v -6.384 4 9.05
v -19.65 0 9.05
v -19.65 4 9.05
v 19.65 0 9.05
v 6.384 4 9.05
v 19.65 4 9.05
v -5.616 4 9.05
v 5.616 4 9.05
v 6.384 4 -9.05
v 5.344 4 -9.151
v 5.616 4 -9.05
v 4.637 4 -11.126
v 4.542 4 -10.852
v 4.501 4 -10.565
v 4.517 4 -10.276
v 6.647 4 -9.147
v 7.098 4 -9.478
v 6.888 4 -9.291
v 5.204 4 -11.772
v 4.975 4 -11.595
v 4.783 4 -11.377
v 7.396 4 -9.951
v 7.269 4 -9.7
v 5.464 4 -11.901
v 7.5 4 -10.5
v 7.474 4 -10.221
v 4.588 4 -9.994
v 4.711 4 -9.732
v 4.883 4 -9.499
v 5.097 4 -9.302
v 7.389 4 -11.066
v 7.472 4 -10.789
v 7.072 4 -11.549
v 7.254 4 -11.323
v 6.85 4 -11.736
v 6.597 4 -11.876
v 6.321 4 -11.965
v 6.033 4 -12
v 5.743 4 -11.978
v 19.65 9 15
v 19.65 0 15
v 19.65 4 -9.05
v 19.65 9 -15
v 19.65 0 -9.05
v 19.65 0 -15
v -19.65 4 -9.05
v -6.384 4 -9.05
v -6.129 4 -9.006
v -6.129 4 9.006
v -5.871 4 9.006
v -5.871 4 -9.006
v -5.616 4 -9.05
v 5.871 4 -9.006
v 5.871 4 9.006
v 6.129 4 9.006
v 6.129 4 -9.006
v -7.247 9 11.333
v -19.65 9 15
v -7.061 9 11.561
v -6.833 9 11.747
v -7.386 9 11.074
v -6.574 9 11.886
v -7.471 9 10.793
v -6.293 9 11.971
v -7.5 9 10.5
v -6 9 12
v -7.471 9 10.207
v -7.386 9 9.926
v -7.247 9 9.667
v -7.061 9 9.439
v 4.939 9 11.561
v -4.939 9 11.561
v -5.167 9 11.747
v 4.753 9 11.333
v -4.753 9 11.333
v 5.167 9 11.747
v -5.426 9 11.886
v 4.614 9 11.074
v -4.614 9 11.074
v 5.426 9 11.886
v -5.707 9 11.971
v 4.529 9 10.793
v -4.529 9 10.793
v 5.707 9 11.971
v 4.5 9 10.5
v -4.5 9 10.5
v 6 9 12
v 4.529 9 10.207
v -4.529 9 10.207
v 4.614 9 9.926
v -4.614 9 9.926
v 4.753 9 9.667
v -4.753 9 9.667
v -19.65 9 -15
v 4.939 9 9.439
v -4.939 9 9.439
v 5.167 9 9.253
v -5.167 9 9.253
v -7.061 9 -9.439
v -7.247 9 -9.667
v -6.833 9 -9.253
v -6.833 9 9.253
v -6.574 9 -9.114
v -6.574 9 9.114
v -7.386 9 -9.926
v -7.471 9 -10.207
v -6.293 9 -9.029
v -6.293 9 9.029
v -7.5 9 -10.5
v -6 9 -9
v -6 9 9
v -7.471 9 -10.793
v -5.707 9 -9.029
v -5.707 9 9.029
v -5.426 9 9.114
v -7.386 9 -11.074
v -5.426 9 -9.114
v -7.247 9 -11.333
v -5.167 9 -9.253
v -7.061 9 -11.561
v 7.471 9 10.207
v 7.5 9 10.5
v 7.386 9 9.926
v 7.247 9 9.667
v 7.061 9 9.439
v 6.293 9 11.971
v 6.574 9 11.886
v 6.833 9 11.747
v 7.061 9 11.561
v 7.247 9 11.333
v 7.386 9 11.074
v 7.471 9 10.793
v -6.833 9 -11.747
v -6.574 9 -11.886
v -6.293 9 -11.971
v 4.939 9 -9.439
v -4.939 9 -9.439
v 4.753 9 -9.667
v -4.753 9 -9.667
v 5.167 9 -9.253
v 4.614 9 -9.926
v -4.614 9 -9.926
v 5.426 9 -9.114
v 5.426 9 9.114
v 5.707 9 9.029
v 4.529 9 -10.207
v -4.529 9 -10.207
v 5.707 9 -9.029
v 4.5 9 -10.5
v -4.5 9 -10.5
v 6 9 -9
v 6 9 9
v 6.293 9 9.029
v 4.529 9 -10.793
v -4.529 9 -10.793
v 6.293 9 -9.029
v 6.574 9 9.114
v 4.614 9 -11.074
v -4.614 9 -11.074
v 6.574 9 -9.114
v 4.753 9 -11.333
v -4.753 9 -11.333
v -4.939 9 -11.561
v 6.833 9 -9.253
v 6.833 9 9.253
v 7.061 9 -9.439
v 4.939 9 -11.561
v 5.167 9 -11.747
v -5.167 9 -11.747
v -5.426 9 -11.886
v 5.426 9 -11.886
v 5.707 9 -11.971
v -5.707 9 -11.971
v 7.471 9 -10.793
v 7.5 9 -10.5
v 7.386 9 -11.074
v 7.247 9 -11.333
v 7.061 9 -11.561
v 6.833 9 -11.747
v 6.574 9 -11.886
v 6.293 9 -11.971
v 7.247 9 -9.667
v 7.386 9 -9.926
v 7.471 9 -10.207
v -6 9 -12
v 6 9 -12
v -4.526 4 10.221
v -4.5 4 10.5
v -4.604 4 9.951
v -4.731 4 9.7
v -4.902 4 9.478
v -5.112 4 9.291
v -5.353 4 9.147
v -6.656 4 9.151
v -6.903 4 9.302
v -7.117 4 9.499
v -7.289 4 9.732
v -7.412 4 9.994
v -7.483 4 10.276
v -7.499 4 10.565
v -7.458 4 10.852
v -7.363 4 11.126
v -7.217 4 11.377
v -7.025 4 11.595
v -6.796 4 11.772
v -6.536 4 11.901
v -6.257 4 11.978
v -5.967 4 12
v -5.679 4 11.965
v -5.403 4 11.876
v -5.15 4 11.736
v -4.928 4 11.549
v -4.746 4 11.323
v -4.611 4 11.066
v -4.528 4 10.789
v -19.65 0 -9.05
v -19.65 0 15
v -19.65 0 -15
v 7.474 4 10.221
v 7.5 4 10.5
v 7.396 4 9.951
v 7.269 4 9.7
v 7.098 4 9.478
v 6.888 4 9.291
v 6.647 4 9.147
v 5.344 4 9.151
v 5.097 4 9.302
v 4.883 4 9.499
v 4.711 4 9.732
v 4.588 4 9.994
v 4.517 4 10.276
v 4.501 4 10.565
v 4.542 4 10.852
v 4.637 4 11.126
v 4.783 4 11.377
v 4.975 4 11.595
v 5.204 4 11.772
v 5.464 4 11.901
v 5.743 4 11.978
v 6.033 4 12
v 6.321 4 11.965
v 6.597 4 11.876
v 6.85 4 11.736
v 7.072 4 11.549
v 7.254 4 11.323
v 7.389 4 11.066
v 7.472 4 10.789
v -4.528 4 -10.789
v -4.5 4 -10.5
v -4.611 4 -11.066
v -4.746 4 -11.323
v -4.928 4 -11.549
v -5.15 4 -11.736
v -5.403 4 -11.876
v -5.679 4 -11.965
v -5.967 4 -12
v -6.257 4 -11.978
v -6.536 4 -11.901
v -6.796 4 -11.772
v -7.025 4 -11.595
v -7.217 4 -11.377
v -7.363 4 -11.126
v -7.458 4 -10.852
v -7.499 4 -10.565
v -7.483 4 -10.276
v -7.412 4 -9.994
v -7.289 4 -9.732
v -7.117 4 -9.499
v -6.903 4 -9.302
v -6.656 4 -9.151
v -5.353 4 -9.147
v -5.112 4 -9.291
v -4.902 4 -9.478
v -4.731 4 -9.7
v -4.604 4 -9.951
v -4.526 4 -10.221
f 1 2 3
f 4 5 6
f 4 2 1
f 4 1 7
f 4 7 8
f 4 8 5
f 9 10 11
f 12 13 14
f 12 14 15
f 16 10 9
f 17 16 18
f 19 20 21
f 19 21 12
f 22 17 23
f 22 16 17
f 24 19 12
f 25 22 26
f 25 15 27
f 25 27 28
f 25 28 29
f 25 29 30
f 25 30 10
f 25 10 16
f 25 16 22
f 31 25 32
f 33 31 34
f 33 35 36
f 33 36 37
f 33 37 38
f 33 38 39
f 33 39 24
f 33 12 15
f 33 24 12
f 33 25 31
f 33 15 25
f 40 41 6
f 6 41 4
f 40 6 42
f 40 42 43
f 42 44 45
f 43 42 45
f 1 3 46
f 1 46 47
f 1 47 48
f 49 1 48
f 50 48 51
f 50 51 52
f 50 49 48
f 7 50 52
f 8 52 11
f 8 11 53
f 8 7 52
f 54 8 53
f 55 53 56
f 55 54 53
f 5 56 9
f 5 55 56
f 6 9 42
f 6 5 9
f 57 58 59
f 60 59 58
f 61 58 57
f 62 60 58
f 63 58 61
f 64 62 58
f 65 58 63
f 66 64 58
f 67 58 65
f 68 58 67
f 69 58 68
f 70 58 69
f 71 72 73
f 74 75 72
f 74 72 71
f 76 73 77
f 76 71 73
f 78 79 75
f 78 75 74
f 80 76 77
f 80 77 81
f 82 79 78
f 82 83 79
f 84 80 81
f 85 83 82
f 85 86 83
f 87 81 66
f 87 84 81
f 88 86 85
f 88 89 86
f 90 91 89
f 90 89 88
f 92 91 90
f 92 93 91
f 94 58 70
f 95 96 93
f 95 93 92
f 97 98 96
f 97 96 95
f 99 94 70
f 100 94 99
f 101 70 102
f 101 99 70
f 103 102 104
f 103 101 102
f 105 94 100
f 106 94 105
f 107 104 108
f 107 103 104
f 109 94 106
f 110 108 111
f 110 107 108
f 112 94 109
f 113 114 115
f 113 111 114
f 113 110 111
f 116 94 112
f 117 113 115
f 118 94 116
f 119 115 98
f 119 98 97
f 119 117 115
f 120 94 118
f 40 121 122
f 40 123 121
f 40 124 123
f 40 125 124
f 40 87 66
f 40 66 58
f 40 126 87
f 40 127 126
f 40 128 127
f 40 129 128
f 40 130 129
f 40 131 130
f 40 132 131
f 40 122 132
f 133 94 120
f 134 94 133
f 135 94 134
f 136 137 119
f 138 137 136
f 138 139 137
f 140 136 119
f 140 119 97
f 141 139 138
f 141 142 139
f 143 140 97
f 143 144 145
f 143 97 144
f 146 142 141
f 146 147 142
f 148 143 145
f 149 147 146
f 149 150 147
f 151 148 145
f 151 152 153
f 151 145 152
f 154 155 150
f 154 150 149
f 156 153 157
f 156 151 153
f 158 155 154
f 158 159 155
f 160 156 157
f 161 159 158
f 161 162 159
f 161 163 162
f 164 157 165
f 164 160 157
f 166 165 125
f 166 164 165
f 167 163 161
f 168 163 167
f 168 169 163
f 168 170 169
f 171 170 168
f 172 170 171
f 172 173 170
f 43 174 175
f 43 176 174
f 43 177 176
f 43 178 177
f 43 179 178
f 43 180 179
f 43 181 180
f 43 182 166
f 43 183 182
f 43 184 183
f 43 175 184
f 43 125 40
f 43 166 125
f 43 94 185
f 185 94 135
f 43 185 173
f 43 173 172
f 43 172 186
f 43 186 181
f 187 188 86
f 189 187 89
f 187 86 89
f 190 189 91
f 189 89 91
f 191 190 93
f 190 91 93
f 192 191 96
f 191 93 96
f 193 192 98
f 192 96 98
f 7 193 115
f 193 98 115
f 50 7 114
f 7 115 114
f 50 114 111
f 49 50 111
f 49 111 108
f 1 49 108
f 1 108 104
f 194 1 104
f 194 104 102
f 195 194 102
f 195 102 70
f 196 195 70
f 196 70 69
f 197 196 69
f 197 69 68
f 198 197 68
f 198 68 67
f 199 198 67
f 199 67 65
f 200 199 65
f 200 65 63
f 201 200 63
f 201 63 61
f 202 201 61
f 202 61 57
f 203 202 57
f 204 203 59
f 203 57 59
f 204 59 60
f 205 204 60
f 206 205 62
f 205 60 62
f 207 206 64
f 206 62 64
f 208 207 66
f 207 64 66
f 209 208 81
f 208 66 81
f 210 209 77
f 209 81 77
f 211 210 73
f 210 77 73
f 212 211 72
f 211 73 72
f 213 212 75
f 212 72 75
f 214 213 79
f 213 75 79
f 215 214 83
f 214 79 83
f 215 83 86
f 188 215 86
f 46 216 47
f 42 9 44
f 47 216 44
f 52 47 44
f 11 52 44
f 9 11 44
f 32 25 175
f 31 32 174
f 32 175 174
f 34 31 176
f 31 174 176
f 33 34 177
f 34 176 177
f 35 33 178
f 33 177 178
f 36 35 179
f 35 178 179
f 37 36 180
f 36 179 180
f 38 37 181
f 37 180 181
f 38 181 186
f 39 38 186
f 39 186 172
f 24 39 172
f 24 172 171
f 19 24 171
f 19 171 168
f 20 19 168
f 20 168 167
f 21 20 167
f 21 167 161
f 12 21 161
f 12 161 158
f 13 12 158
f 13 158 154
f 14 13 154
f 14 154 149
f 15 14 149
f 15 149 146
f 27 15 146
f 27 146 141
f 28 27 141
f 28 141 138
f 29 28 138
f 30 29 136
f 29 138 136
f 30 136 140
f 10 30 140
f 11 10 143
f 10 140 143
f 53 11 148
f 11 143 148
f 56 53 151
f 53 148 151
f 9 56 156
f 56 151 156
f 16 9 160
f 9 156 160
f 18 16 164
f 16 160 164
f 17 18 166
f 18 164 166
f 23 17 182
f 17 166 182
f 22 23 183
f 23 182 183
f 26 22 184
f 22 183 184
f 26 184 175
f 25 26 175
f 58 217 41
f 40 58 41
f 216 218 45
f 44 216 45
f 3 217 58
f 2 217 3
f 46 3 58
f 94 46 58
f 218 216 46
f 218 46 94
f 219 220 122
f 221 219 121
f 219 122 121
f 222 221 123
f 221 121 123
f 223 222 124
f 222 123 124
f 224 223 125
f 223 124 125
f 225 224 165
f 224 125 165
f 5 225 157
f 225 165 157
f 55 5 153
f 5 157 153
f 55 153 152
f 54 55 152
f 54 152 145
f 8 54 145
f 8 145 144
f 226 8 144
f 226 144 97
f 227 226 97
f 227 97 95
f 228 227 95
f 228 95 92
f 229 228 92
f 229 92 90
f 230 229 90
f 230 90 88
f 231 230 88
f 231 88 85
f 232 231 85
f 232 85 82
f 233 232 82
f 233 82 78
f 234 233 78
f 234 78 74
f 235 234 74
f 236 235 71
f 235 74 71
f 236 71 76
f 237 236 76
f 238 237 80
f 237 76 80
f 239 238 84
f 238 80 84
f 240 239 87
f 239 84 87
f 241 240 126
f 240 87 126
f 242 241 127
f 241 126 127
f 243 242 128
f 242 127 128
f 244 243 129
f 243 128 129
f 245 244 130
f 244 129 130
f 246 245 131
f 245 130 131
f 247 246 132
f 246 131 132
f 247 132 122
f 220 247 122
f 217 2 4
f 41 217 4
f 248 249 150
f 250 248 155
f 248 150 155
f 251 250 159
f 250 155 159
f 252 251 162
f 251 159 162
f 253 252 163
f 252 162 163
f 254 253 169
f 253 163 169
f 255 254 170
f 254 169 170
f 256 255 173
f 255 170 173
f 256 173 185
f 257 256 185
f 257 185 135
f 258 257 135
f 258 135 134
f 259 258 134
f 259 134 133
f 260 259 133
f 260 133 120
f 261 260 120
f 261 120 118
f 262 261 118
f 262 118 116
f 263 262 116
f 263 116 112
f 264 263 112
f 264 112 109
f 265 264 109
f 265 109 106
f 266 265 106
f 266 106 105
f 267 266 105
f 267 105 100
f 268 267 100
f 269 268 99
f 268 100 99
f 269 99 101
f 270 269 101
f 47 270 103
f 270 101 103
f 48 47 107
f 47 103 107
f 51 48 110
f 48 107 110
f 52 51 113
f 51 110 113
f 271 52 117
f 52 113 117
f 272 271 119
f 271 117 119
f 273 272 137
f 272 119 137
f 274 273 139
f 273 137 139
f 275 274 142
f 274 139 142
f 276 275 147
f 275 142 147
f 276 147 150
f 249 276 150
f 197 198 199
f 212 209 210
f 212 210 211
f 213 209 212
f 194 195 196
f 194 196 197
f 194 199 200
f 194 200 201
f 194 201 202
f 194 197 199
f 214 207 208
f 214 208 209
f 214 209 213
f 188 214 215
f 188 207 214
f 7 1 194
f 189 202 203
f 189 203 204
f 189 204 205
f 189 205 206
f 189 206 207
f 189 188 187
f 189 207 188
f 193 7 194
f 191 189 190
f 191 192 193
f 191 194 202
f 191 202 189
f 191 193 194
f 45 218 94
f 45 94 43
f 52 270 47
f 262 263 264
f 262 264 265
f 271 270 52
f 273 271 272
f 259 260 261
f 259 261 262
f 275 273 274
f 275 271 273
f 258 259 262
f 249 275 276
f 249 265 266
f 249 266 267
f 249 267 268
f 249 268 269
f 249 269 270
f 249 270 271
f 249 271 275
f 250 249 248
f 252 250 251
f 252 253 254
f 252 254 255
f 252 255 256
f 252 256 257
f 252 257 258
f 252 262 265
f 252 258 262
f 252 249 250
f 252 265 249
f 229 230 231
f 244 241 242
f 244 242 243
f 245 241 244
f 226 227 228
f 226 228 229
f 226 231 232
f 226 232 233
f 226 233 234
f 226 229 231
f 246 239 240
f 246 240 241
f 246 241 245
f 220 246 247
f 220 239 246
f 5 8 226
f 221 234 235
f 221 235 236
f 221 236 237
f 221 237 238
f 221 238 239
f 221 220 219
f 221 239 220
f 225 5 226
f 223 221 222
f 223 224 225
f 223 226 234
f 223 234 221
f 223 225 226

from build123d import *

# Parameters (mm, degrees)
SKETCH_1_W          = 39.3
SKETCH_1_H          = 30
EXTRUDE_1_DEPTH     = 9
SKETCH_2_W          = 39.3
SKETCH_2_H          = 18.1
CUT_EXTRUDE_1_DEPTH = 4
SKETCH_3_R          = 1.5
CUT_EXTRUDE_2_DEPTH = 5


with BuildPart() as part:
    # 草图1 → 凸台-拉伸1 (new body)
    with BuildSketch(Plane(origin=(0, 0, 0), x_dir=(1, 0, 0), z_dir=(0, 1, 0))):
        Rectangle(SKETCH_1_W, SKETCH_1_H)
    extrude(amount=EXTRUDE_1_DEPTH)

    # 草图2 → 切除-拉伸1 (cut)
    with BuildSketch(Plane.XZ):
        Rectangle(SKETCH_2_W, SKETCH_2_H)
    extrude(amount=-CUT_EXTRUDE_1_DEPTH, mode=Mode.SUBTRACT)

    # 草图3 → 切除-拉伸2 (cut)
    with BuildSketch(Plane(origin=(0, 9, 0), x_dir=(1, 0, 0), z_dir=(0, 1, 0))):
        with Locations((-6, 10.5)):
            Circle(SKETCH_3_R)
        with Locations((6, 10.5)):
            Circle(SKETCH_3_R)
        with Locations((6, -10.5)):
            Circle(SKETCH_3_R)
        with Locations((-6, -10.5)):
            Circle(SKETCH_3_R)
    extrude(amount=-CUT_EXTRUDE_2_DEPTH, mode=Mode.SUBTRACT)


solid = part.part
